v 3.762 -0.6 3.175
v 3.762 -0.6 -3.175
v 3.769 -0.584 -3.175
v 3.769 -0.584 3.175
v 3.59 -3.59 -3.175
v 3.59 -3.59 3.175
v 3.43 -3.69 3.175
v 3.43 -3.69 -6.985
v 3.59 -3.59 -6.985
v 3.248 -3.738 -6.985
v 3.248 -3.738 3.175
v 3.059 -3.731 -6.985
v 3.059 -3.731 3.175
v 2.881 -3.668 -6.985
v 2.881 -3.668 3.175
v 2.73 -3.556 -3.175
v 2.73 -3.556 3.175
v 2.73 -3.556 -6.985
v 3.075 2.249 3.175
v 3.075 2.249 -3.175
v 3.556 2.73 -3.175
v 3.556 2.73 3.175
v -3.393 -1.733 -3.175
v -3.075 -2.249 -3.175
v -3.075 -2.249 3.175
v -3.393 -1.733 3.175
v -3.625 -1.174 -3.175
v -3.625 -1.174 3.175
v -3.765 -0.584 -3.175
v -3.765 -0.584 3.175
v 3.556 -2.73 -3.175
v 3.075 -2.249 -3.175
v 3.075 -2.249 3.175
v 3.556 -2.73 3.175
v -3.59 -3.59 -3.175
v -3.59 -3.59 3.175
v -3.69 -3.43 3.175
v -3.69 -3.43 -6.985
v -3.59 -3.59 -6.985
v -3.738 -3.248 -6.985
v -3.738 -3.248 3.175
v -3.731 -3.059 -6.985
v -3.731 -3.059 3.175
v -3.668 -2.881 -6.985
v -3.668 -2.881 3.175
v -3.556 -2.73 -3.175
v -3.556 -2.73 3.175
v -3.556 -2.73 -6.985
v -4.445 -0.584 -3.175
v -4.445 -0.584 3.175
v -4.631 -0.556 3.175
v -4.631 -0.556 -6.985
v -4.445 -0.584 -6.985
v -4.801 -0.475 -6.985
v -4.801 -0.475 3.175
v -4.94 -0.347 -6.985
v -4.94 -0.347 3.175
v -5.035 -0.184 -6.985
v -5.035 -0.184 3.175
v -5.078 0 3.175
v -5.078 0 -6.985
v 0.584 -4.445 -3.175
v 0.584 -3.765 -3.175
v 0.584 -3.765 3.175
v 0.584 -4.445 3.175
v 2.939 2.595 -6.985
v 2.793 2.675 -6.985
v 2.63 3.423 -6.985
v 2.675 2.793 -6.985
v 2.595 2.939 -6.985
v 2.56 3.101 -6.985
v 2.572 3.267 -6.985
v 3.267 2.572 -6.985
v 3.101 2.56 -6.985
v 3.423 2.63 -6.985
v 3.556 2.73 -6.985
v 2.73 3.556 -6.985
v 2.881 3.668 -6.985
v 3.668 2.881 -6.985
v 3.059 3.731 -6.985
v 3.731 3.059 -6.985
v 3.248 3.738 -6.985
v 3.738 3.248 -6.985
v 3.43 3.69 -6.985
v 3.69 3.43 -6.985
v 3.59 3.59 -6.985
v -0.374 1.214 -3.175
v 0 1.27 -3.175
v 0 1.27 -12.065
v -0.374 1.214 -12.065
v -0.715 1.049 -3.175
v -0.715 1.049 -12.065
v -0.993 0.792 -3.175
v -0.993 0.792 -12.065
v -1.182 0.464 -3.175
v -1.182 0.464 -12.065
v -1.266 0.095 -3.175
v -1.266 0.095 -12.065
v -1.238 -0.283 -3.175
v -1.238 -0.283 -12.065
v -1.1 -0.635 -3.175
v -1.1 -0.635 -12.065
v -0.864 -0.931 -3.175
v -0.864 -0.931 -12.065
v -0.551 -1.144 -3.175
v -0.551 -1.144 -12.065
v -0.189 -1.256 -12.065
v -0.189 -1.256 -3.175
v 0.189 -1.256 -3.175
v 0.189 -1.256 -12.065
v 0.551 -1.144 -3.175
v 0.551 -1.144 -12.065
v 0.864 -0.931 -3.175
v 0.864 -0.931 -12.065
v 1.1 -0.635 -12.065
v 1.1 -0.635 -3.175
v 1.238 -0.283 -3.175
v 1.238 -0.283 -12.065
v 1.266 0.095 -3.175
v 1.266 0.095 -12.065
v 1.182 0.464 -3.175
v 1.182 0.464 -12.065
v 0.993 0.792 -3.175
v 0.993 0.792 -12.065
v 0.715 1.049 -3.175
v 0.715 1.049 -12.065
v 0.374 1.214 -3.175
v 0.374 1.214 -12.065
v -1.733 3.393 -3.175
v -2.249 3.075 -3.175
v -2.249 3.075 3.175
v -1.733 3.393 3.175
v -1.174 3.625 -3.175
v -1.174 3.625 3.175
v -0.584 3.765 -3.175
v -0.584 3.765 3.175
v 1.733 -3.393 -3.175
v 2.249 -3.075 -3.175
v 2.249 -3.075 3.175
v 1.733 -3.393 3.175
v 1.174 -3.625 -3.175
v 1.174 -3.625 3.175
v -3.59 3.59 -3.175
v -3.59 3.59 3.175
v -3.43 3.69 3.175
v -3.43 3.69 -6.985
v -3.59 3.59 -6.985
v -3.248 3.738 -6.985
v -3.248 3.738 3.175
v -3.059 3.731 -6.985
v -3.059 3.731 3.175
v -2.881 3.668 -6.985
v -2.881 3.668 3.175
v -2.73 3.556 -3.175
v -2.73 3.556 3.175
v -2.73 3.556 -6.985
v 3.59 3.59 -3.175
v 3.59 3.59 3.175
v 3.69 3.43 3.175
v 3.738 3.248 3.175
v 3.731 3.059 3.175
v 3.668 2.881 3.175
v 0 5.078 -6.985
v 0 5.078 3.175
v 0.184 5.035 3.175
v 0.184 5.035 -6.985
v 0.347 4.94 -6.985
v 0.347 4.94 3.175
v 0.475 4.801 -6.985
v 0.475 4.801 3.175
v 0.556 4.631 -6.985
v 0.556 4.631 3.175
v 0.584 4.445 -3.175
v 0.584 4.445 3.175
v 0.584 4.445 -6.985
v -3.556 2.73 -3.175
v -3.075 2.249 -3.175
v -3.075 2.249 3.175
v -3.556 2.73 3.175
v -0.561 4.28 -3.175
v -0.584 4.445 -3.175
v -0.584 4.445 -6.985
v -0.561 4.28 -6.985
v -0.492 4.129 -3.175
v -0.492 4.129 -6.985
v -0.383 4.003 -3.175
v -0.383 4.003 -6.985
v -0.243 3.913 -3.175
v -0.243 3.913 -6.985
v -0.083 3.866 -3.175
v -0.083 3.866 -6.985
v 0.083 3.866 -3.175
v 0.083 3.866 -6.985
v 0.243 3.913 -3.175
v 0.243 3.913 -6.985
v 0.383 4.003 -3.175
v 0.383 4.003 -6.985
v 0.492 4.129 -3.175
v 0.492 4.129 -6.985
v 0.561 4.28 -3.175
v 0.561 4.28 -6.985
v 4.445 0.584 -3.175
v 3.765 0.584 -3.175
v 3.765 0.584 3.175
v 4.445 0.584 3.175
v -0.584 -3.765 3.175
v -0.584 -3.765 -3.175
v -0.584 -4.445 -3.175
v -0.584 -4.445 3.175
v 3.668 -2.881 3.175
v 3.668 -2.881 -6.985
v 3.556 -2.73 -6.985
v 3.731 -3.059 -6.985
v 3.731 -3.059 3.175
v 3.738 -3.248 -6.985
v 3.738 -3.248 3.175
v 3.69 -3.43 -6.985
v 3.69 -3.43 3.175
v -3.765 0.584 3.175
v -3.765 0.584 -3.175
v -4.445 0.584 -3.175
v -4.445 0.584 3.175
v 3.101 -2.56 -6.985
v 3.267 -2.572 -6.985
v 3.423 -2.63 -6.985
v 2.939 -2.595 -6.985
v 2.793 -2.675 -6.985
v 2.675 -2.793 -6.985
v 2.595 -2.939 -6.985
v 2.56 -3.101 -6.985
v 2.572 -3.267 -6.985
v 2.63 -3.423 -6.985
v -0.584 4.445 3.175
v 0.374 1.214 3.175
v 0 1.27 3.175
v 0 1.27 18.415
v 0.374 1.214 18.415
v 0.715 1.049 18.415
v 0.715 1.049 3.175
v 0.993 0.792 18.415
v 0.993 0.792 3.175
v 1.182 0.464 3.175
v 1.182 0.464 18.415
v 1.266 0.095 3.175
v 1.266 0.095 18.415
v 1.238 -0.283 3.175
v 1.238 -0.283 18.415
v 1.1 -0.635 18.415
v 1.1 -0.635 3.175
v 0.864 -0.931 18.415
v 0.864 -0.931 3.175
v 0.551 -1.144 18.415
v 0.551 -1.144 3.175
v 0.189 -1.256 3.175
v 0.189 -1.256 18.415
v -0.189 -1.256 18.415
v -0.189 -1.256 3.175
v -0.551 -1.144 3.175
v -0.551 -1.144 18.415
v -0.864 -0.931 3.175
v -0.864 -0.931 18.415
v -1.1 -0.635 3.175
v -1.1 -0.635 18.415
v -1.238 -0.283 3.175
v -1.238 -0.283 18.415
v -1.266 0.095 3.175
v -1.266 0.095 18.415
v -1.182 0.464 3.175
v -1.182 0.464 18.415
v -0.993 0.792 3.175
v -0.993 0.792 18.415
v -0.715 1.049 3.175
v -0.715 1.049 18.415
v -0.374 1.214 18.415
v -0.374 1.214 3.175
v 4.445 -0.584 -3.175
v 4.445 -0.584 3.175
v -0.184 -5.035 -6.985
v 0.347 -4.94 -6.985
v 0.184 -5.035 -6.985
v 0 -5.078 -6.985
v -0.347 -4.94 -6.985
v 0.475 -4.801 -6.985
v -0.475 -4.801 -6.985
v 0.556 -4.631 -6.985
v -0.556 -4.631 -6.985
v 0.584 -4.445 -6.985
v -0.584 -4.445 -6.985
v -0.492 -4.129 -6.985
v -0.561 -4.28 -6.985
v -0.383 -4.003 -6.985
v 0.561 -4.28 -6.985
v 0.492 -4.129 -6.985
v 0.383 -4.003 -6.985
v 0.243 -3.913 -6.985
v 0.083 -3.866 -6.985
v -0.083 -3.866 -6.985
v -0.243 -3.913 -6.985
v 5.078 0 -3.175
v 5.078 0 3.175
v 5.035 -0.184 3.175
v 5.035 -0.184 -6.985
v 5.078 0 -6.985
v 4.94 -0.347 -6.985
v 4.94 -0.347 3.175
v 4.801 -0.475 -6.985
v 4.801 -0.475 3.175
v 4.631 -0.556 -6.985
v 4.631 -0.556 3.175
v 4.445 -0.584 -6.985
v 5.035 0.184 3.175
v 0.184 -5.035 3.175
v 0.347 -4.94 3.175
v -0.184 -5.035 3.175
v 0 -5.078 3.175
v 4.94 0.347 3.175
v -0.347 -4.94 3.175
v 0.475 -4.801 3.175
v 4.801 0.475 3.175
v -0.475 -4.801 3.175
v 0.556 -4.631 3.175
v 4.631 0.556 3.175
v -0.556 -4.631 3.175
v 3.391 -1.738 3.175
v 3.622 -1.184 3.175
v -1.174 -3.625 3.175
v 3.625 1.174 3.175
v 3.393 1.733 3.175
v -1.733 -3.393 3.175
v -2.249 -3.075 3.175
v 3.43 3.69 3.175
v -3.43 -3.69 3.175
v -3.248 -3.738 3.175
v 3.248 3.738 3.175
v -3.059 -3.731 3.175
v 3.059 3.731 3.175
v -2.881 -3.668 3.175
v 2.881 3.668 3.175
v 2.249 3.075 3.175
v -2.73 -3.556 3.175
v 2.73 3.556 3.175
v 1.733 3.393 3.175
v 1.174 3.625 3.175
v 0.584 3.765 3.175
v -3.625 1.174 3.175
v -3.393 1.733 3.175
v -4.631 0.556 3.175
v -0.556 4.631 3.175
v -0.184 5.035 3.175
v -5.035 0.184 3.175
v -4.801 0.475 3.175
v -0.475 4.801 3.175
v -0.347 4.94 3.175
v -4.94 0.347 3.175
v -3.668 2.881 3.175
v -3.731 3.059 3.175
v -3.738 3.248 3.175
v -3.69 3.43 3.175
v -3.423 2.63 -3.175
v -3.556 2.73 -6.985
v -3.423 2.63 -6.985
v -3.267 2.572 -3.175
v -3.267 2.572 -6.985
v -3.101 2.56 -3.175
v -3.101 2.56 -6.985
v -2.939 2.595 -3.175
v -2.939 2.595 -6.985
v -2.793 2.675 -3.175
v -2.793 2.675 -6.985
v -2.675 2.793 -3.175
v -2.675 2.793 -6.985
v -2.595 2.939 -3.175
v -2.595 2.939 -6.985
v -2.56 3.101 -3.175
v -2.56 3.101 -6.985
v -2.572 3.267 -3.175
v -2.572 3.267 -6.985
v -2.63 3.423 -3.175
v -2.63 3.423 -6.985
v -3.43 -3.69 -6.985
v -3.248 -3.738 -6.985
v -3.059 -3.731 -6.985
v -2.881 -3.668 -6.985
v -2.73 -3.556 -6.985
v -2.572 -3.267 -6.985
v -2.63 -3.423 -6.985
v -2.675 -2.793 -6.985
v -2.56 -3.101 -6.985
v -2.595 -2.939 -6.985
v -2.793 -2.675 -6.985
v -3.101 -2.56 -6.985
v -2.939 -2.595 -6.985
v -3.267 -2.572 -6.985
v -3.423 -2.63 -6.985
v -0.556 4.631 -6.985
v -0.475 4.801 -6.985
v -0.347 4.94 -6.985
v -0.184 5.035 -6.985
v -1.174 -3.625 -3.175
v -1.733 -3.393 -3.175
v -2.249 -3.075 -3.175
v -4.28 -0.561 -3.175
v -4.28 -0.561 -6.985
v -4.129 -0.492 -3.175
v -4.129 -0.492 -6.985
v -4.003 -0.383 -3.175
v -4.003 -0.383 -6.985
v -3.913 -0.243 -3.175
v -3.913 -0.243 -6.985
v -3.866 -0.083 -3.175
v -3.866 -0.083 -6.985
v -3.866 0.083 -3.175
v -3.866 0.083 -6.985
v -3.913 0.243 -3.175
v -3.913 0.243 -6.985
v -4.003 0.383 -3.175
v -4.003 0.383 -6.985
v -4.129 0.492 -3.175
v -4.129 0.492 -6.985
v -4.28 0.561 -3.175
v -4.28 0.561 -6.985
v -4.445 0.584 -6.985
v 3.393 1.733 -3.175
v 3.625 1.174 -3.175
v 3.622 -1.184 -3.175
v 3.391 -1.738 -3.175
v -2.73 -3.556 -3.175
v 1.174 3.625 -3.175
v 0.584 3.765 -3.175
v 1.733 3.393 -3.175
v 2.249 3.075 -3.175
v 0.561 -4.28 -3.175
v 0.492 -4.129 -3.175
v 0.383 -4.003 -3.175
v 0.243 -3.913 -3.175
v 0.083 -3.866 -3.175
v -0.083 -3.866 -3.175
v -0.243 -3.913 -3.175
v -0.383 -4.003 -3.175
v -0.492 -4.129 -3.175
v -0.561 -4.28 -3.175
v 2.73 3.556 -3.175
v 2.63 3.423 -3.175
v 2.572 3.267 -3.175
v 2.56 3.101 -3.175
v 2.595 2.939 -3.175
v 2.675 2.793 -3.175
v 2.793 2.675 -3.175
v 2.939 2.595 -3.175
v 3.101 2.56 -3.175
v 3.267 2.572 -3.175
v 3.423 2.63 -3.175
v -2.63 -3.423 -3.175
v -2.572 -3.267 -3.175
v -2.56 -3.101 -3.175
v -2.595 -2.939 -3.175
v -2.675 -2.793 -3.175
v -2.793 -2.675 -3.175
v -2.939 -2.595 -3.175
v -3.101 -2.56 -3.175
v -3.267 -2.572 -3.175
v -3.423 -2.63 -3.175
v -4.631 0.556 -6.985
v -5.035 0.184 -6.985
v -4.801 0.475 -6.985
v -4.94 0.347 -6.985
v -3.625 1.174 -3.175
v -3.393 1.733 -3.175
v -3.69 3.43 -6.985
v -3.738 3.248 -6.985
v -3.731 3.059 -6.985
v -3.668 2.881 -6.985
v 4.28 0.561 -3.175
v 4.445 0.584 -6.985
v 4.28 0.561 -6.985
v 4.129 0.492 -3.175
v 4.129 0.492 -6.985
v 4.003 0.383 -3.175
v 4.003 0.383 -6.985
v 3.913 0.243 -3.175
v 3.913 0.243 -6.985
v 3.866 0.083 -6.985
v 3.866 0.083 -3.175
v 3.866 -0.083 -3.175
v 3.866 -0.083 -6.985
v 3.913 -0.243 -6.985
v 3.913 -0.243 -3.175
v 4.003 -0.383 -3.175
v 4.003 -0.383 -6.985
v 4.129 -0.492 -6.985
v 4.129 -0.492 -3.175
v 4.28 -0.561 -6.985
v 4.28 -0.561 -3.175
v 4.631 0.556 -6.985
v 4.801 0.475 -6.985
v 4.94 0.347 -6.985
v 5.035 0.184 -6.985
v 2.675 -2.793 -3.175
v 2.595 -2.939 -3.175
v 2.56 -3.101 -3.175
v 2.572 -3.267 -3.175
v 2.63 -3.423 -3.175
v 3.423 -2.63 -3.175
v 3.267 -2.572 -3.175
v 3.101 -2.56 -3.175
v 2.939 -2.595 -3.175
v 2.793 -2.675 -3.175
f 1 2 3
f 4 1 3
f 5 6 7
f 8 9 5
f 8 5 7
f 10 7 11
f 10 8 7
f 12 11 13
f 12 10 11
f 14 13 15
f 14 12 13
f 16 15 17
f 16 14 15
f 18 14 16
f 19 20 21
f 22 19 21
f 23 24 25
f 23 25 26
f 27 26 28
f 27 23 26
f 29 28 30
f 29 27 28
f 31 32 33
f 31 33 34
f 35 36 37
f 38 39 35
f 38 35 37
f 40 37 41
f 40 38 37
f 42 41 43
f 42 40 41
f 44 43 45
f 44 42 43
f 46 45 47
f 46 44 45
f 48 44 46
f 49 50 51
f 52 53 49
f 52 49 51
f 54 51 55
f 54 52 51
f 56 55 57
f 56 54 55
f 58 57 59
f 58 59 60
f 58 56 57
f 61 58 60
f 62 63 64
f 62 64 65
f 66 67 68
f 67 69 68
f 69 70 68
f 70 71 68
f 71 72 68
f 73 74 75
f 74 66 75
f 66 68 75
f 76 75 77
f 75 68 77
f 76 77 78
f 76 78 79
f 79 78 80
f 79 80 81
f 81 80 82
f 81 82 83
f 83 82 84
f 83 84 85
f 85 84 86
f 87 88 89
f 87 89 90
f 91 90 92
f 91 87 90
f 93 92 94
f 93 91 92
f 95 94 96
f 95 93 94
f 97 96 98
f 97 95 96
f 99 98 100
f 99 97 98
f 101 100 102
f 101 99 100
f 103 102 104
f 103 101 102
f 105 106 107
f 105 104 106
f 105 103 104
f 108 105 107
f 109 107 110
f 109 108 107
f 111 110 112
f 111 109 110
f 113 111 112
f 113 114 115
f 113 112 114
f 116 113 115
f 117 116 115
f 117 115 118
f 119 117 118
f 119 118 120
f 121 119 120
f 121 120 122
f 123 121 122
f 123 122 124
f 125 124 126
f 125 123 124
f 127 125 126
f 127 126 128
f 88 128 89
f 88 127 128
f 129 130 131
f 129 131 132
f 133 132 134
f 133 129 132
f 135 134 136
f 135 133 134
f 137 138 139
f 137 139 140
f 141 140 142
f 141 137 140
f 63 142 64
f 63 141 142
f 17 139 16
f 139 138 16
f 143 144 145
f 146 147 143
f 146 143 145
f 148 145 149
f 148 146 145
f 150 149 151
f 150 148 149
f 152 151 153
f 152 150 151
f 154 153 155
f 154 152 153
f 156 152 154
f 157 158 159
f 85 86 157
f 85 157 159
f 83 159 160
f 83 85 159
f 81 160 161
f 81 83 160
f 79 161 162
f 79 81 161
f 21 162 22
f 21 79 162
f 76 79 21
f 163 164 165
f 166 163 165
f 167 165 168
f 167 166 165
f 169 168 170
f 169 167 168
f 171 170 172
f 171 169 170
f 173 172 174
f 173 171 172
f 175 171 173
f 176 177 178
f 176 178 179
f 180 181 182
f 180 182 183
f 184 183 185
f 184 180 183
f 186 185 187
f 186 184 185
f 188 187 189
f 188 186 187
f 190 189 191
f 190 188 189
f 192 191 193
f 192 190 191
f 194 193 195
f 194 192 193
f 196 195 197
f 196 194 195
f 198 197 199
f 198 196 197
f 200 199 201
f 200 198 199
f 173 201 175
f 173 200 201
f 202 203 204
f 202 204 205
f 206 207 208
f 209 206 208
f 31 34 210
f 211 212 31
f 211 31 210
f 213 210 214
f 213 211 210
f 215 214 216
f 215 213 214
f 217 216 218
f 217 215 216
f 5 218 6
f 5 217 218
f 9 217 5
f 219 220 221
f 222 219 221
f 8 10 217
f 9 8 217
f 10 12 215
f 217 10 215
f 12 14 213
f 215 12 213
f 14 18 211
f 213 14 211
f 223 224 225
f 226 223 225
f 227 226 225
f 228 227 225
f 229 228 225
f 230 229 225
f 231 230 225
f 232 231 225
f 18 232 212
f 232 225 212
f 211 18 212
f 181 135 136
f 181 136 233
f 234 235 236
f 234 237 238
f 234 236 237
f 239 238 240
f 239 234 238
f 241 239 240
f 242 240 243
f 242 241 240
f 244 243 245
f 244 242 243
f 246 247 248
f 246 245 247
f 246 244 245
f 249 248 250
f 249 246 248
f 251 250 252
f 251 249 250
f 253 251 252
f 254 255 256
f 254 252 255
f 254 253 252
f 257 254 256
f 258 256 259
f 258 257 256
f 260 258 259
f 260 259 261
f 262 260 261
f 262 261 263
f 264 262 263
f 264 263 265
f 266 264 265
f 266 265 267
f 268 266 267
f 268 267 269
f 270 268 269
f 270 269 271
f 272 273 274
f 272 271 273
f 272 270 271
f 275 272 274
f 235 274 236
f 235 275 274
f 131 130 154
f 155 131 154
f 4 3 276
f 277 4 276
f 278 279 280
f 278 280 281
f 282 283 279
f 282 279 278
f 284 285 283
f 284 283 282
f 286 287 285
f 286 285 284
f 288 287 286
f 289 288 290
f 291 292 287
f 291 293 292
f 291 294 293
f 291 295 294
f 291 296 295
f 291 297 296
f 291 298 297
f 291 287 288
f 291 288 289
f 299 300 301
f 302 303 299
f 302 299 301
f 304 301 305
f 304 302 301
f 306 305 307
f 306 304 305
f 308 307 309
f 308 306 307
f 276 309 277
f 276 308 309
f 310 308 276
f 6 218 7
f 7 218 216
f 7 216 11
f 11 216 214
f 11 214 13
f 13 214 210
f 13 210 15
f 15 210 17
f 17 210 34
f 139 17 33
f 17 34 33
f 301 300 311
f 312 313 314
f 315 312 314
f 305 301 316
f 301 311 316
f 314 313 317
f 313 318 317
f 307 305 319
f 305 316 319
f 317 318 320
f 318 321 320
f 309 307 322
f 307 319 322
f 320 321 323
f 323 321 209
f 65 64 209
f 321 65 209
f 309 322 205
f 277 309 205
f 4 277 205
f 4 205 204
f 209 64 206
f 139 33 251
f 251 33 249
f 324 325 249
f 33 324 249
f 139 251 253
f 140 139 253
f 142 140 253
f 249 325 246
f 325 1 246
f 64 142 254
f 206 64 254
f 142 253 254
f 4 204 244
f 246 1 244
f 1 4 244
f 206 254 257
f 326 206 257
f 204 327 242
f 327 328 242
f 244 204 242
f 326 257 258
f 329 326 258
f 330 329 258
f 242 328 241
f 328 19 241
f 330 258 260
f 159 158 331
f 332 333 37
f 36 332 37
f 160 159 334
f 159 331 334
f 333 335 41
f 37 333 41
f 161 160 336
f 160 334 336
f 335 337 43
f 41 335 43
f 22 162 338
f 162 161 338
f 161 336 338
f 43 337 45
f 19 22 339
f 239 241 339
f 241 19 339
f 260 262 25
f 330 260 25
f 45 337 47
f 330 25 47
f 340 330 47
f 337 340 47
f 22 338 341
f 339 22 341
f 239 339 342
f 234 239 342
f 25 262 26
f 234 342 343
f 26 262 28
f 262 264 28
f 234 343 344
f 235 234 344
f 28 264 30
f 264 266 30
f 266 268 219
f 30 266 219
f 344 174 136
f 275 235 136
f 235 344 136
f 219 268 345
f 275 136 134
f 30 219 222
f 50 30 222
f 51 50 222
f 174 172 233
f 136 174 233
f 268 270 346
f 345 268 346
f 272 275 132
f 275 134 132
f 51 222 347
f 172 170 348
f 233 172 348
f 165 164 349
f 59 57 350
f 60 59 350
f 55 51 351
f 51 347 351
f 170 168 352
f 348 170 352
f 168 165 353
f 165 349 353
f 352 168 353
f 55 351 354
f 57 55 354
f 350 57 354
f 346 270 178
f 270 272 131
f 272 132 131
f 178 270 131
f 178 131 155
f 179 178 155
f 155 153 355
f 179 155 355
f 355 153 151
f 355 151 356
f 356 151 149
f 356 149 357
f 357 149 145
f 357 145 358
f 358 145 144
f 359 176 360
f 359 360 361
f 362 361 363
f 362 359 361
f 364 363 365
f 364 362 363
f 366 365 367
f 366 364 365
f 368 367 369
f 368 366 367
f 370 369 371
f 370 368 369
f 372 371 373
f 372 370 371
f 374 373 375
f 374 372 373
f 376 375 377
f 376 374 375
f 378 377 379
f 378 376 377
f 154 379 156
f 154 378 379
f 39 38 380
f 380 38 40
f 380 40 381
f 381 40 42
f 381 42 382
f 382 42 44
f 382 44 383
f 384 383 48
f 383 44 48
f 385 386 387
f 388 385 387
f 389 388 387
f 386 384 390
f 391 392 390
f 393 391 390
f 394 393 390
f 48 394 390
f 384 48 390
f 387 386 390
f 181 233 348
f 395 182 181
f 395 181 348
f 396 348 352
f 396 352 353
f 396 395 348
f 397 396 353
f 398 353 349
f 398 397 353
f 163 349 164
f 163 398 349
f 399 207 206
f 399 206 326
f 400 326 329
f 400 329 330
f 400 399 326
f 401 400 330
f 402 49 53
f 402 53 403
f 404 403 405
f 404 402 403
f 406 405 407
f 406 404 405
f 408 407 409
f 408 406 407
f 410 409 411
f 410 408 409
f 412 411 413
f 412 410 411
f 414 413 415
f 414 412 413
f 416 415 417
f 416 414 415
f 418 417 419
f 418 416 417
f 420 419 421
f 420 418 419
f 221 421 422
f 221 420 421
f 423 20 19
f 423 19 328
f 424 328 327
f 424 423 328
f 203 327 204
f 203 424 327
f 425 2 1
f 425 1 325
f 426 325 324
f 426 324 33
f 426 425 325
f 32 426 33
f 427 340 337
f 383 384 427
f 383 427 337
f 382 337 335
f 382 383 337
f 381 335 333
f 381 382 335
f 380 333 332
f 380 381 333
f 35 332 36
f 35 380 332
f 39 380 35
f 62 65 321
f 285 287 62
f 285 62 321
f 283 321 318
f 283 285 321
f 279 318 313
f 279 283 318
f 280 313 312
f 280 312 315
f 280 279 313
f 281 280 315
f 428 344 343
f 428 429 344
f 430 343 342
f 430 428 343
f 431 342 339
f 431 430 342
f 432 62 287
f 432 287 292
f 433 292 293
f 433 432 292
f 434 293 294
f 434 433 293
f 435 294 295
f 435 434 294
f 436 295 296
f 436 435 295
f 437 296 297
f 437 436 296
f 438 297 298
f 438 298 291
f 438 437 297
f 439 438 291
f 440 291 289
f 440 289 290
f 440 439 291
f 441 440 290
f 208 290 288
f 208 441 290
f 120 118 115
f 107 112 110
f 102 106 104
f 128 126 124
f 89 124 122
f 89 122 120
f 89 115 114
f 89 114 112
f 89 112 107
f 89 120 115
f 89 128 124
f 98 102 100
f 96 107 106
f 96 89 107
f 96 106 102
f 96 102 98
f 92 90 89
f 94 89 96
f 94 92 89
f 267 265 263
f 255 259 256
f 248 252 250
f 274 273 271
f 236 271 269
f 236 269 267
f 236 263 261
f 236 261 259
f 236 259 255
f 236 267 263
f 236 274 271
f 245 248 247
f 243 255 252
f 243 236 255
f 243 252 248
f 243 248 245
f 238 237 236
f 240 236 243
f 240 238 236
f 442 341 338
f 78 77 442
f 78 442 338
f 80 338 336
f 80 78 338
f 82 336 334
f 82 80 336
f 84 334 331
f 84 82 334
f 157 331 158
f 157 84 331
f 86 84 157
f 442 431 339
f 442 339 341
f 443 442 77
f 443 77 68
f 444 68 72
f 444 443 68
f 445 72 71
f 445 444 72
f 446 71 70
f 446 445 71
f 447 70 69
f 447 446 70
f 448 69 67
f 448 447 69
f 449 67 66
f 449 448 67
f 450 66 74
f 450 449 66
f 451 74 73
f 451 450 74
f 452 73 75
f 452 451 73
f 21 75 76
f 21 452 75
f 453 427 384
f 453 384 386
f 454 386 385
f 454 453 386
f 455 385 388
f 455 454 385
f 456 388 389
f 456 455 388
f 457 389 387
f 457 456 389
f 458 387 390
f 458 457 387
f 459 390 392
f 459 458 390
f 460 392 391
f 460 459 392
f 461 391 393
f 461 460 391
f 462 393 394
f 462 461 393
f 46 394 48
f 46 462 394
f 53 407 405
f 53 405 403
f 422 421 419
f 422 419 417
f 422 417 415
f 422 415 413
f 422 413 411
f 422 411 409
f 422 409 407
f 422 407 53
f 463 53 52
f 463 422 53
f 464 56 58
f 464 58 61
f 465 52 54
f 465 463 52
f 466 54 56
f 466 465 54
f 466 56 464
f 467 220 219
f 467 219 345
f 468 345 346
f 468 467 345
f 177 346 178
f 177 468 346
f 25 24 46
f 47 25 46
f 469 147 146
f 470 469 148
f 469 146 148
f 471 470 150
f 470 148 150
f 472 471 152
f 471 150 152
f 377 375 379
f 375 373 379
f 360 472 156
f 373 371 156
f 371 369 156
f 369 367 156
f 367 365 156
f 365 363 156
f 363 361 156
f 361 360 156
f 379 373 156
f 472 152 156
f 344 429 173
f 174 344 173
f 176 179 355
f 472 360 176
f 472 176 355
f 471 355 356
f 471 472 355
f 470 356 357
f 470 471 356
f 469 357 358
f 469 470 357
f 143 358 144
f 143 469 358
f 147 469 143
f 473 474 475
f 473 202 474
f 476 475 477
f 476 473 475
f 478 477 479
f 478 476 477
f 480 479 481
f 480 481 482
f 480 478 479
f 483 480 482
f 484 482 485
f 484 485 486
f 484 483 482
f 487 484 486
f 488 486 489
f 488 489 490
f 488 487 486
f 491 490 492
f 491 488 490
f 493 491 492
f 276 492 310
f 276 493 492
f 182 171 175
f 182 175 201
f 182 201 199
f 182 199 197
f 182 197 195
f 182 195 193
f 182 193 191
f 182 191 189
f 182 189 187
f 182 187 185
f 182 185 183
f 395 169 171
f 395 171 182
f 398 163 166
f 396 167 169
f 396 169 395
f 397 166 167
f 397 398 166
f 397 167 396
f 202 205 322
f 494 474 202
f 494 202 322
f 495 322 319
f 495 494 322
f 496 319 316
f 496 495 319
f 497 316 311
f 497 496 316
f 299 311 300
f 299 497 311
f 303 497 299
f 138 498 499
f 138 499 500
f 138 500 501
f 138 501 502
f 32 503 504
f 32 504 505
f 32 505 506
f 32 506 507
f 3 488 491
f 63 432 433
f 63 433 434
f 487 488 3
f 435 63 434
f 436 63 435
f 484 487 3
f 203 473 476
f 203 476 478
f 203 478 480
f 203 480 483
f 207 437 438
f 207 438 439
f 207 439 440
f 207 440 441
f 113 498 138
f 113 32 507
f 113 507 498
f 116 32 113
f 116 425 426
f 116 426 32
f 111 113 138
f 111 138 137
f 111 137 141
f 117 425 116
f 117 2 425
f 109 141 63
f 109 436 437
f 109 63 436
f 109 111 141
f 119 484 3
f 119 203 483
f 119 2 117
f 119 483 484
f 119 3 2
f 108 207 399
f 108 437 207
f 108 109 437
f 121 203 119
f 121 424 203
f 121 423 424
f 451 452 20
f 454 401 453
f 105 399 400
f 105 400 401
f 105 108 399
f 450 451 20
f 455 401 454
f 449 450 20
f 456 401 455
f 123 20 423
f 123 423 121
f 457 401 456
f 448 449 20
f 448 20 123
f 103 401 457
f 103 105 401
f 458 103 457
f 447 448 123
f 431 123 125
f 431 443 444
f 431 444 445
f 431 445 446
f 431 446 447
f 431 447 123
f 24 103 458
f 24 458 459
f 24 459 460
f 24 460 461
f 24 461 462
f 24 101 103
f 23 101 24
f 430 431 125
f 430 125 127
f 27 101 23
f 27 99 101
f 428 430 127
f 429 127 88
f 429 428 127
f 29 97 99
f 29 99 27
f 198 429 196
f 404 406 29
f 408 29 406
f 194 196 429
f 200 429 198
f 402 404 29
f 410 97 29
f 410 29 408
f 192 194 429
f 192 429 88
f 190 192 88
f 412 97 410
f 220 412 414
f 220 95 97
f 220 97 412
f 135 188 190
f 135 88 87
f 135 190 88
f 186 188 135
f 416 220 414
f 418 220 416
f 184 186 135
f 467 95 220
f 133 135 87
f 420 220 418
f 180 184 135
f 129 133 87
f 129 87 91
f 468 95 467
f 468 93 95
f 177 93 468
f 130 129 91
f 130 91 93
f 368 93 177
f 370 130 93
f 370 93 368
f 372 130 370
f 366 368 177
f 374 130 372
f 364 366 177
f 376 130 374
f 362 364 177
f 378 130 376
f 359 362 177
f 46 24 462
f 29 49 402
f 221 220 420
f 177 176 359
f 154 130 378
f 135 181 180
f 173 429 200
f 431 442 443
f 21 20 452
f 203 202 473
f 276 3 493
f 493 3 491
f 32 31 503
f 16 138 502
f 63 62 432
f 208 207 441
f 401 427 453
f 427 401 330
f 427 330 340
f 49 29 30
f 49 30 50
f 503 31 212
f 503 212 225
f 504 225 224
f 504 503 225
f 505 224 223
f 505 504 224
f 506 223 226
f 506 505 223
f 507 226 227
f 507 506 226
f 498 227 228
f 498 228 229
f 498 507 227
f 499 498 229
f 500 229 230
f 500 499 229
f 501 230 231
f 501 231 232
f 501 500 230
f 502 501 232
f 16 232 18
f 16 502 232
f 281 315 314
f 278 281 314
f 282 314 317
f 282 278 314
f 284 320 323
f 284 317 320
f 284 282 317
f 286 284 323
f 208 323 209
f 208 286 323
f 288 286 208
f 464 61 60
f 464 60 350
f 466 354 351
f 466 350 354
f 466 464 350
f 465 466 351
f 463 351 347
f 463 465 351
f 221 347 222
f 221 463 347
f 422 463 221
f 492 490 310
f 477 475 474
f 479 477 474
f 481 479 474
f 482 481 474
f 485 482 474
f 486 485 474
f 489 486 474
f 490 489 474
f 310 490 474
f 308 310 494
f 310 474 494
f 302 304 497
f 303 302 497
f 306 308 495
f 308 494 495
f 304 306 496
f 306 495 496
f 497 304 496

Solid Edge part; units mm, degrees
sketch "Sketch1" plane through (0, 0, 0) normal (0, 0, 1) x (1, 0, 0)
  arc A0 (-0.5843, 4.4447) -> (0, 5.0777) centre (0.0507, 4.4447) cw
  arc A1 (0.5843, 4.4447) -> (0, 5.0777) centre (-0.0507, 4.4447) ccw
  line L0 (0.5843, 3.7649) -> (0.5843, 4.4447)
  arc A2 (2.249, 3.0754) -> (0.5843, 3.7649) centre (0, 0) ccw
  line L1 (2.249, 3.0754) -> (2.7297, 3.5561)
  arc A3 (2.7297, 3.5561) -> (3.5905, 3.5905) centre (3.1787, 3.1071) cw
  arc A4 (3.5561, 2.7297) -> (3.5905, 3.5905) centre (3.1071, 3.1787) ccw
  line L2 (3.0754, 2.249) -> (3.5561, 2.7297)
  arc A5 (3.7649, 0.5843) -> (3.0754, 2.249) centre (0, 0) ccw
  line L3 (3.7649, 0.5843) -> (4.4447, 0.5843)
  arc A6 (4.4447, 0.5843) -> (5.0777, 0) centre (4.4447, -0.0507) cw
  arc A7 (4.4447, -0.5843) -> (5.0777, 0) centre (4.4447, 0.0507) ccw
  line L4 (3.7689, -0.5843) -> (4.4447, -0.5843)
  line L5 (3.7625, -0.5998) -> (3.7689, -0.5843)
  arc A8 (3.7625, -0.5998) -> (3.0754, -2.249) centre (0, 0) cw
  line L6 (3.0754, -2.249) -> (3.5561, -2.7297)
  arc A9 (3.5561, -2.7297) -> (3.5905, -3.5905) centre (3.1071, -3.1787) cw
  arc A10 (2.7297, -3.5561) -> (3.5905, -3.5905) centre (3.1787, -3.1071) ccw
  line L7 (2.249, -3.0754) -> (2.7297, -3.5561)
  arc A11 (2.249, -3.0754) -> (0.5843, -3.7649) centre (0, 0) cw
  line L8 (0.5843, -3.7649) -> (0.5843, -4.4447)
  arc A12 (0.5843, -4.4447) -> (0, -5.0777) centre (-0.0507, -4.4447) cw
  arc A13 (-0.5843, -4.4447) -> (0, -5.0777) centre (0.0507, -4.4447) ccw
  line L9 (-0.5843, -3.7649) -> (-0.5843, -4.4447)
  arc A14 (-0.5843, -3.7649) -> (-2.249, -3.0754) centre (0, 0) cw
  line L10 (-2.249, -3.0754) -> (-2.7297, -3.5561)
  arc A15 (-2.7297, -3.5561) -> (-3.5905, -3.5905) centre (-3.1787, -3.1071) cw
  arc A16 (-3.5561, -2.7297) -> (-3.5905, -3.5905) centre (-3.1071, -3.1787) ccw
  line L11 (-3.0754, -2.249) -> (-3.5561, -2.7297)
  arc A17 (-3.0754, -2.249) -> (-3.7649, -0.5843) centre (0, 0) cw
  line L12 (-3.7649, -0.5843) -> (-4.4447, -0.5843)
  arc A18 (-4.4447, -0.5843) -> (-5.0777, 0) centre (-4.4447, 0.0507) cw
  arc A19 (-4.4447, 0.5843) -> (-5.0777, 0) centre (-4.4447, -0.0507) ccw
  line L13 (-3.7649, 0.5843) -> (-4.4447, 0.5843)
  arc A20 (-3.7649, 0.5843) -> (-3.0754, 2.249) centre (0, 0) cw
  line L14 (-3.0754, 2.249) -> (-3.5561, 2.7297)
  arc A21 (-3.5561, 2.7297) -> (-3.5905, 3.5905) centre (-3.1071, 3.1787) cw
  arc A22 (-2.7297, 3.5561) -> (-3.5905, 3.5905) centre (-3.1787, 3.1071) ccw
  line L15 (-2.249, 3.0754) -> (-2.7297, 3.5561)
  arc A23 (-2.249, 3.0754) -> (-0.5843, 3.7649) centre (0, 0) cw
  line L16 (-0.5843, 3.7649) -> (-0.5843, 4.4447)
extrude "Protrusion1" add sketch "Sketch1" along normal mid plane 6.35
sketch "Sketch2" plane through (0, 0, 0) normal (0, 0, 1) x (1, 0, 0)
  arc A0 (3.5561, 2.7297) -> (3.5905, 3.5905) centre (3.1071, 3.1787) ccw
  arc A1 (2.7297, 3.5561) -> (3.5905, 3.5905) centre (3.1787, 3.1071) cw
  arc A2 (3.5561, 2.7297) -> (2.7297, 3.5561) centre (3.1429, 3.1429) cw
  arc A3 (4.4447, 0.5843) -> (4.4447, -0.5843) centre (4.4447, 0) ccw
  arc A4 (4.4447, -0.5843) -> (5.0777, 0) centre (4.4447, 0.0507) ccw
  arc A5 (4.4447, 0.5843) -> (5.0777, 0) centre (4.4447, -0.0507) cw
  arc A6 (3.5561, -2.7297) -> (2.7297, -3.5561) centre (3.1429, -3.1429) ccw
  arc A7 (2.7297, -3.5561) -> (3.5905, -3.5905) centre (3.1787, -3.1071) ccw
  arc A8 (3.5561, -2.7297) -> (3.5905, -3.5905) centre (3.1071, -3.1787) cw
  arc A9 (0.5843, -4.4447) -> (0, -5.0777) centre (-0.0507, -4.4447) cw
  arc A10 (-0.5843, -4.4447) -> (0, -5.0777) centre (0.0507, -4.4447) ccw
  arc A11 (0.5843, -4.4447) -> (-0.5843, -4.4447) centre (0, -4.4447) ccw
  arc A12 (-2.7297, -3.5561) -> (-3.5561, -2.7297) centre (-3.1429, -3.1429) ccw
  arc A13 (-3.5561, -2.7297) -> (-3.5905, -3.5905) centre (-3.1071, -3.1787) ccw
  arc A14 (-2.7297, -3.5561) -> (-3.5905, -3.5905) centre (-3.1787, -3.1071) cw
  arc A15 (-4.4447, 0.5843) -> (-4.4447, -0.5843) centre (-4.4447, 0) cw
  arc A16 (-4.4447, -0.5843) -> (-5.0777, 0) centre (-4.4447, 0.0507) cw
  arc A17 (-4.4447, 0.5843) -> (-5.0777, 0) centre (-4.4447, -0.0507) ccw
  arc A18 (-2.7297, 3.5561) -> (-3.5905, 3.5905) centre (-3.1787, 3.1071) ccw
  arc A19 (-3.5561, 2.7297) -> (-3.5905, 3.5905) centre (-3.1071, 3.1787) cw
  arc A20 (-2.7297, 3.5561) -> (-3.5561, 2.7297) centre (-3.1429, 3.1429) cw
  arc A21 (0.5843, 4.4447) -> (-0.5843, 4.4447) centre (0, 4.4447) cw
  arc A22 (-0.5843, 4.4447) -> (0, 5.0777) centre (0.0507, 4.4447) cw
  arc A23 (0.5843, 4.4447) -> (0, 5.0777) centre (-0.0507, 4.4447) ccw
  dimension "D1" = 3.81
  dimension "D2" = 0.0168
extrude "ExtrudedProtrusion_2" add sketch "Sketch2" against normal blind 6.985
sketch "Sketch3" plane through (0, 0, -3.175) normal (0, 0, -1) x (0, 1, 0)
  circle A0 centre (0, 0) radius 1.27
extrude "ExtrudedProtrusion_3" add sketch "Sketch3" along normal blind 8.89
sketch "Sketch4" plane through (0, 0, 3.175) normal (0, 0, 1) x (0, 1, 0)
  circle A0 centre (0, 0) radius 1.27
extrude "ExtrudedProtrusion_4" add sketch "Sketch4" along normal blind 15.24
